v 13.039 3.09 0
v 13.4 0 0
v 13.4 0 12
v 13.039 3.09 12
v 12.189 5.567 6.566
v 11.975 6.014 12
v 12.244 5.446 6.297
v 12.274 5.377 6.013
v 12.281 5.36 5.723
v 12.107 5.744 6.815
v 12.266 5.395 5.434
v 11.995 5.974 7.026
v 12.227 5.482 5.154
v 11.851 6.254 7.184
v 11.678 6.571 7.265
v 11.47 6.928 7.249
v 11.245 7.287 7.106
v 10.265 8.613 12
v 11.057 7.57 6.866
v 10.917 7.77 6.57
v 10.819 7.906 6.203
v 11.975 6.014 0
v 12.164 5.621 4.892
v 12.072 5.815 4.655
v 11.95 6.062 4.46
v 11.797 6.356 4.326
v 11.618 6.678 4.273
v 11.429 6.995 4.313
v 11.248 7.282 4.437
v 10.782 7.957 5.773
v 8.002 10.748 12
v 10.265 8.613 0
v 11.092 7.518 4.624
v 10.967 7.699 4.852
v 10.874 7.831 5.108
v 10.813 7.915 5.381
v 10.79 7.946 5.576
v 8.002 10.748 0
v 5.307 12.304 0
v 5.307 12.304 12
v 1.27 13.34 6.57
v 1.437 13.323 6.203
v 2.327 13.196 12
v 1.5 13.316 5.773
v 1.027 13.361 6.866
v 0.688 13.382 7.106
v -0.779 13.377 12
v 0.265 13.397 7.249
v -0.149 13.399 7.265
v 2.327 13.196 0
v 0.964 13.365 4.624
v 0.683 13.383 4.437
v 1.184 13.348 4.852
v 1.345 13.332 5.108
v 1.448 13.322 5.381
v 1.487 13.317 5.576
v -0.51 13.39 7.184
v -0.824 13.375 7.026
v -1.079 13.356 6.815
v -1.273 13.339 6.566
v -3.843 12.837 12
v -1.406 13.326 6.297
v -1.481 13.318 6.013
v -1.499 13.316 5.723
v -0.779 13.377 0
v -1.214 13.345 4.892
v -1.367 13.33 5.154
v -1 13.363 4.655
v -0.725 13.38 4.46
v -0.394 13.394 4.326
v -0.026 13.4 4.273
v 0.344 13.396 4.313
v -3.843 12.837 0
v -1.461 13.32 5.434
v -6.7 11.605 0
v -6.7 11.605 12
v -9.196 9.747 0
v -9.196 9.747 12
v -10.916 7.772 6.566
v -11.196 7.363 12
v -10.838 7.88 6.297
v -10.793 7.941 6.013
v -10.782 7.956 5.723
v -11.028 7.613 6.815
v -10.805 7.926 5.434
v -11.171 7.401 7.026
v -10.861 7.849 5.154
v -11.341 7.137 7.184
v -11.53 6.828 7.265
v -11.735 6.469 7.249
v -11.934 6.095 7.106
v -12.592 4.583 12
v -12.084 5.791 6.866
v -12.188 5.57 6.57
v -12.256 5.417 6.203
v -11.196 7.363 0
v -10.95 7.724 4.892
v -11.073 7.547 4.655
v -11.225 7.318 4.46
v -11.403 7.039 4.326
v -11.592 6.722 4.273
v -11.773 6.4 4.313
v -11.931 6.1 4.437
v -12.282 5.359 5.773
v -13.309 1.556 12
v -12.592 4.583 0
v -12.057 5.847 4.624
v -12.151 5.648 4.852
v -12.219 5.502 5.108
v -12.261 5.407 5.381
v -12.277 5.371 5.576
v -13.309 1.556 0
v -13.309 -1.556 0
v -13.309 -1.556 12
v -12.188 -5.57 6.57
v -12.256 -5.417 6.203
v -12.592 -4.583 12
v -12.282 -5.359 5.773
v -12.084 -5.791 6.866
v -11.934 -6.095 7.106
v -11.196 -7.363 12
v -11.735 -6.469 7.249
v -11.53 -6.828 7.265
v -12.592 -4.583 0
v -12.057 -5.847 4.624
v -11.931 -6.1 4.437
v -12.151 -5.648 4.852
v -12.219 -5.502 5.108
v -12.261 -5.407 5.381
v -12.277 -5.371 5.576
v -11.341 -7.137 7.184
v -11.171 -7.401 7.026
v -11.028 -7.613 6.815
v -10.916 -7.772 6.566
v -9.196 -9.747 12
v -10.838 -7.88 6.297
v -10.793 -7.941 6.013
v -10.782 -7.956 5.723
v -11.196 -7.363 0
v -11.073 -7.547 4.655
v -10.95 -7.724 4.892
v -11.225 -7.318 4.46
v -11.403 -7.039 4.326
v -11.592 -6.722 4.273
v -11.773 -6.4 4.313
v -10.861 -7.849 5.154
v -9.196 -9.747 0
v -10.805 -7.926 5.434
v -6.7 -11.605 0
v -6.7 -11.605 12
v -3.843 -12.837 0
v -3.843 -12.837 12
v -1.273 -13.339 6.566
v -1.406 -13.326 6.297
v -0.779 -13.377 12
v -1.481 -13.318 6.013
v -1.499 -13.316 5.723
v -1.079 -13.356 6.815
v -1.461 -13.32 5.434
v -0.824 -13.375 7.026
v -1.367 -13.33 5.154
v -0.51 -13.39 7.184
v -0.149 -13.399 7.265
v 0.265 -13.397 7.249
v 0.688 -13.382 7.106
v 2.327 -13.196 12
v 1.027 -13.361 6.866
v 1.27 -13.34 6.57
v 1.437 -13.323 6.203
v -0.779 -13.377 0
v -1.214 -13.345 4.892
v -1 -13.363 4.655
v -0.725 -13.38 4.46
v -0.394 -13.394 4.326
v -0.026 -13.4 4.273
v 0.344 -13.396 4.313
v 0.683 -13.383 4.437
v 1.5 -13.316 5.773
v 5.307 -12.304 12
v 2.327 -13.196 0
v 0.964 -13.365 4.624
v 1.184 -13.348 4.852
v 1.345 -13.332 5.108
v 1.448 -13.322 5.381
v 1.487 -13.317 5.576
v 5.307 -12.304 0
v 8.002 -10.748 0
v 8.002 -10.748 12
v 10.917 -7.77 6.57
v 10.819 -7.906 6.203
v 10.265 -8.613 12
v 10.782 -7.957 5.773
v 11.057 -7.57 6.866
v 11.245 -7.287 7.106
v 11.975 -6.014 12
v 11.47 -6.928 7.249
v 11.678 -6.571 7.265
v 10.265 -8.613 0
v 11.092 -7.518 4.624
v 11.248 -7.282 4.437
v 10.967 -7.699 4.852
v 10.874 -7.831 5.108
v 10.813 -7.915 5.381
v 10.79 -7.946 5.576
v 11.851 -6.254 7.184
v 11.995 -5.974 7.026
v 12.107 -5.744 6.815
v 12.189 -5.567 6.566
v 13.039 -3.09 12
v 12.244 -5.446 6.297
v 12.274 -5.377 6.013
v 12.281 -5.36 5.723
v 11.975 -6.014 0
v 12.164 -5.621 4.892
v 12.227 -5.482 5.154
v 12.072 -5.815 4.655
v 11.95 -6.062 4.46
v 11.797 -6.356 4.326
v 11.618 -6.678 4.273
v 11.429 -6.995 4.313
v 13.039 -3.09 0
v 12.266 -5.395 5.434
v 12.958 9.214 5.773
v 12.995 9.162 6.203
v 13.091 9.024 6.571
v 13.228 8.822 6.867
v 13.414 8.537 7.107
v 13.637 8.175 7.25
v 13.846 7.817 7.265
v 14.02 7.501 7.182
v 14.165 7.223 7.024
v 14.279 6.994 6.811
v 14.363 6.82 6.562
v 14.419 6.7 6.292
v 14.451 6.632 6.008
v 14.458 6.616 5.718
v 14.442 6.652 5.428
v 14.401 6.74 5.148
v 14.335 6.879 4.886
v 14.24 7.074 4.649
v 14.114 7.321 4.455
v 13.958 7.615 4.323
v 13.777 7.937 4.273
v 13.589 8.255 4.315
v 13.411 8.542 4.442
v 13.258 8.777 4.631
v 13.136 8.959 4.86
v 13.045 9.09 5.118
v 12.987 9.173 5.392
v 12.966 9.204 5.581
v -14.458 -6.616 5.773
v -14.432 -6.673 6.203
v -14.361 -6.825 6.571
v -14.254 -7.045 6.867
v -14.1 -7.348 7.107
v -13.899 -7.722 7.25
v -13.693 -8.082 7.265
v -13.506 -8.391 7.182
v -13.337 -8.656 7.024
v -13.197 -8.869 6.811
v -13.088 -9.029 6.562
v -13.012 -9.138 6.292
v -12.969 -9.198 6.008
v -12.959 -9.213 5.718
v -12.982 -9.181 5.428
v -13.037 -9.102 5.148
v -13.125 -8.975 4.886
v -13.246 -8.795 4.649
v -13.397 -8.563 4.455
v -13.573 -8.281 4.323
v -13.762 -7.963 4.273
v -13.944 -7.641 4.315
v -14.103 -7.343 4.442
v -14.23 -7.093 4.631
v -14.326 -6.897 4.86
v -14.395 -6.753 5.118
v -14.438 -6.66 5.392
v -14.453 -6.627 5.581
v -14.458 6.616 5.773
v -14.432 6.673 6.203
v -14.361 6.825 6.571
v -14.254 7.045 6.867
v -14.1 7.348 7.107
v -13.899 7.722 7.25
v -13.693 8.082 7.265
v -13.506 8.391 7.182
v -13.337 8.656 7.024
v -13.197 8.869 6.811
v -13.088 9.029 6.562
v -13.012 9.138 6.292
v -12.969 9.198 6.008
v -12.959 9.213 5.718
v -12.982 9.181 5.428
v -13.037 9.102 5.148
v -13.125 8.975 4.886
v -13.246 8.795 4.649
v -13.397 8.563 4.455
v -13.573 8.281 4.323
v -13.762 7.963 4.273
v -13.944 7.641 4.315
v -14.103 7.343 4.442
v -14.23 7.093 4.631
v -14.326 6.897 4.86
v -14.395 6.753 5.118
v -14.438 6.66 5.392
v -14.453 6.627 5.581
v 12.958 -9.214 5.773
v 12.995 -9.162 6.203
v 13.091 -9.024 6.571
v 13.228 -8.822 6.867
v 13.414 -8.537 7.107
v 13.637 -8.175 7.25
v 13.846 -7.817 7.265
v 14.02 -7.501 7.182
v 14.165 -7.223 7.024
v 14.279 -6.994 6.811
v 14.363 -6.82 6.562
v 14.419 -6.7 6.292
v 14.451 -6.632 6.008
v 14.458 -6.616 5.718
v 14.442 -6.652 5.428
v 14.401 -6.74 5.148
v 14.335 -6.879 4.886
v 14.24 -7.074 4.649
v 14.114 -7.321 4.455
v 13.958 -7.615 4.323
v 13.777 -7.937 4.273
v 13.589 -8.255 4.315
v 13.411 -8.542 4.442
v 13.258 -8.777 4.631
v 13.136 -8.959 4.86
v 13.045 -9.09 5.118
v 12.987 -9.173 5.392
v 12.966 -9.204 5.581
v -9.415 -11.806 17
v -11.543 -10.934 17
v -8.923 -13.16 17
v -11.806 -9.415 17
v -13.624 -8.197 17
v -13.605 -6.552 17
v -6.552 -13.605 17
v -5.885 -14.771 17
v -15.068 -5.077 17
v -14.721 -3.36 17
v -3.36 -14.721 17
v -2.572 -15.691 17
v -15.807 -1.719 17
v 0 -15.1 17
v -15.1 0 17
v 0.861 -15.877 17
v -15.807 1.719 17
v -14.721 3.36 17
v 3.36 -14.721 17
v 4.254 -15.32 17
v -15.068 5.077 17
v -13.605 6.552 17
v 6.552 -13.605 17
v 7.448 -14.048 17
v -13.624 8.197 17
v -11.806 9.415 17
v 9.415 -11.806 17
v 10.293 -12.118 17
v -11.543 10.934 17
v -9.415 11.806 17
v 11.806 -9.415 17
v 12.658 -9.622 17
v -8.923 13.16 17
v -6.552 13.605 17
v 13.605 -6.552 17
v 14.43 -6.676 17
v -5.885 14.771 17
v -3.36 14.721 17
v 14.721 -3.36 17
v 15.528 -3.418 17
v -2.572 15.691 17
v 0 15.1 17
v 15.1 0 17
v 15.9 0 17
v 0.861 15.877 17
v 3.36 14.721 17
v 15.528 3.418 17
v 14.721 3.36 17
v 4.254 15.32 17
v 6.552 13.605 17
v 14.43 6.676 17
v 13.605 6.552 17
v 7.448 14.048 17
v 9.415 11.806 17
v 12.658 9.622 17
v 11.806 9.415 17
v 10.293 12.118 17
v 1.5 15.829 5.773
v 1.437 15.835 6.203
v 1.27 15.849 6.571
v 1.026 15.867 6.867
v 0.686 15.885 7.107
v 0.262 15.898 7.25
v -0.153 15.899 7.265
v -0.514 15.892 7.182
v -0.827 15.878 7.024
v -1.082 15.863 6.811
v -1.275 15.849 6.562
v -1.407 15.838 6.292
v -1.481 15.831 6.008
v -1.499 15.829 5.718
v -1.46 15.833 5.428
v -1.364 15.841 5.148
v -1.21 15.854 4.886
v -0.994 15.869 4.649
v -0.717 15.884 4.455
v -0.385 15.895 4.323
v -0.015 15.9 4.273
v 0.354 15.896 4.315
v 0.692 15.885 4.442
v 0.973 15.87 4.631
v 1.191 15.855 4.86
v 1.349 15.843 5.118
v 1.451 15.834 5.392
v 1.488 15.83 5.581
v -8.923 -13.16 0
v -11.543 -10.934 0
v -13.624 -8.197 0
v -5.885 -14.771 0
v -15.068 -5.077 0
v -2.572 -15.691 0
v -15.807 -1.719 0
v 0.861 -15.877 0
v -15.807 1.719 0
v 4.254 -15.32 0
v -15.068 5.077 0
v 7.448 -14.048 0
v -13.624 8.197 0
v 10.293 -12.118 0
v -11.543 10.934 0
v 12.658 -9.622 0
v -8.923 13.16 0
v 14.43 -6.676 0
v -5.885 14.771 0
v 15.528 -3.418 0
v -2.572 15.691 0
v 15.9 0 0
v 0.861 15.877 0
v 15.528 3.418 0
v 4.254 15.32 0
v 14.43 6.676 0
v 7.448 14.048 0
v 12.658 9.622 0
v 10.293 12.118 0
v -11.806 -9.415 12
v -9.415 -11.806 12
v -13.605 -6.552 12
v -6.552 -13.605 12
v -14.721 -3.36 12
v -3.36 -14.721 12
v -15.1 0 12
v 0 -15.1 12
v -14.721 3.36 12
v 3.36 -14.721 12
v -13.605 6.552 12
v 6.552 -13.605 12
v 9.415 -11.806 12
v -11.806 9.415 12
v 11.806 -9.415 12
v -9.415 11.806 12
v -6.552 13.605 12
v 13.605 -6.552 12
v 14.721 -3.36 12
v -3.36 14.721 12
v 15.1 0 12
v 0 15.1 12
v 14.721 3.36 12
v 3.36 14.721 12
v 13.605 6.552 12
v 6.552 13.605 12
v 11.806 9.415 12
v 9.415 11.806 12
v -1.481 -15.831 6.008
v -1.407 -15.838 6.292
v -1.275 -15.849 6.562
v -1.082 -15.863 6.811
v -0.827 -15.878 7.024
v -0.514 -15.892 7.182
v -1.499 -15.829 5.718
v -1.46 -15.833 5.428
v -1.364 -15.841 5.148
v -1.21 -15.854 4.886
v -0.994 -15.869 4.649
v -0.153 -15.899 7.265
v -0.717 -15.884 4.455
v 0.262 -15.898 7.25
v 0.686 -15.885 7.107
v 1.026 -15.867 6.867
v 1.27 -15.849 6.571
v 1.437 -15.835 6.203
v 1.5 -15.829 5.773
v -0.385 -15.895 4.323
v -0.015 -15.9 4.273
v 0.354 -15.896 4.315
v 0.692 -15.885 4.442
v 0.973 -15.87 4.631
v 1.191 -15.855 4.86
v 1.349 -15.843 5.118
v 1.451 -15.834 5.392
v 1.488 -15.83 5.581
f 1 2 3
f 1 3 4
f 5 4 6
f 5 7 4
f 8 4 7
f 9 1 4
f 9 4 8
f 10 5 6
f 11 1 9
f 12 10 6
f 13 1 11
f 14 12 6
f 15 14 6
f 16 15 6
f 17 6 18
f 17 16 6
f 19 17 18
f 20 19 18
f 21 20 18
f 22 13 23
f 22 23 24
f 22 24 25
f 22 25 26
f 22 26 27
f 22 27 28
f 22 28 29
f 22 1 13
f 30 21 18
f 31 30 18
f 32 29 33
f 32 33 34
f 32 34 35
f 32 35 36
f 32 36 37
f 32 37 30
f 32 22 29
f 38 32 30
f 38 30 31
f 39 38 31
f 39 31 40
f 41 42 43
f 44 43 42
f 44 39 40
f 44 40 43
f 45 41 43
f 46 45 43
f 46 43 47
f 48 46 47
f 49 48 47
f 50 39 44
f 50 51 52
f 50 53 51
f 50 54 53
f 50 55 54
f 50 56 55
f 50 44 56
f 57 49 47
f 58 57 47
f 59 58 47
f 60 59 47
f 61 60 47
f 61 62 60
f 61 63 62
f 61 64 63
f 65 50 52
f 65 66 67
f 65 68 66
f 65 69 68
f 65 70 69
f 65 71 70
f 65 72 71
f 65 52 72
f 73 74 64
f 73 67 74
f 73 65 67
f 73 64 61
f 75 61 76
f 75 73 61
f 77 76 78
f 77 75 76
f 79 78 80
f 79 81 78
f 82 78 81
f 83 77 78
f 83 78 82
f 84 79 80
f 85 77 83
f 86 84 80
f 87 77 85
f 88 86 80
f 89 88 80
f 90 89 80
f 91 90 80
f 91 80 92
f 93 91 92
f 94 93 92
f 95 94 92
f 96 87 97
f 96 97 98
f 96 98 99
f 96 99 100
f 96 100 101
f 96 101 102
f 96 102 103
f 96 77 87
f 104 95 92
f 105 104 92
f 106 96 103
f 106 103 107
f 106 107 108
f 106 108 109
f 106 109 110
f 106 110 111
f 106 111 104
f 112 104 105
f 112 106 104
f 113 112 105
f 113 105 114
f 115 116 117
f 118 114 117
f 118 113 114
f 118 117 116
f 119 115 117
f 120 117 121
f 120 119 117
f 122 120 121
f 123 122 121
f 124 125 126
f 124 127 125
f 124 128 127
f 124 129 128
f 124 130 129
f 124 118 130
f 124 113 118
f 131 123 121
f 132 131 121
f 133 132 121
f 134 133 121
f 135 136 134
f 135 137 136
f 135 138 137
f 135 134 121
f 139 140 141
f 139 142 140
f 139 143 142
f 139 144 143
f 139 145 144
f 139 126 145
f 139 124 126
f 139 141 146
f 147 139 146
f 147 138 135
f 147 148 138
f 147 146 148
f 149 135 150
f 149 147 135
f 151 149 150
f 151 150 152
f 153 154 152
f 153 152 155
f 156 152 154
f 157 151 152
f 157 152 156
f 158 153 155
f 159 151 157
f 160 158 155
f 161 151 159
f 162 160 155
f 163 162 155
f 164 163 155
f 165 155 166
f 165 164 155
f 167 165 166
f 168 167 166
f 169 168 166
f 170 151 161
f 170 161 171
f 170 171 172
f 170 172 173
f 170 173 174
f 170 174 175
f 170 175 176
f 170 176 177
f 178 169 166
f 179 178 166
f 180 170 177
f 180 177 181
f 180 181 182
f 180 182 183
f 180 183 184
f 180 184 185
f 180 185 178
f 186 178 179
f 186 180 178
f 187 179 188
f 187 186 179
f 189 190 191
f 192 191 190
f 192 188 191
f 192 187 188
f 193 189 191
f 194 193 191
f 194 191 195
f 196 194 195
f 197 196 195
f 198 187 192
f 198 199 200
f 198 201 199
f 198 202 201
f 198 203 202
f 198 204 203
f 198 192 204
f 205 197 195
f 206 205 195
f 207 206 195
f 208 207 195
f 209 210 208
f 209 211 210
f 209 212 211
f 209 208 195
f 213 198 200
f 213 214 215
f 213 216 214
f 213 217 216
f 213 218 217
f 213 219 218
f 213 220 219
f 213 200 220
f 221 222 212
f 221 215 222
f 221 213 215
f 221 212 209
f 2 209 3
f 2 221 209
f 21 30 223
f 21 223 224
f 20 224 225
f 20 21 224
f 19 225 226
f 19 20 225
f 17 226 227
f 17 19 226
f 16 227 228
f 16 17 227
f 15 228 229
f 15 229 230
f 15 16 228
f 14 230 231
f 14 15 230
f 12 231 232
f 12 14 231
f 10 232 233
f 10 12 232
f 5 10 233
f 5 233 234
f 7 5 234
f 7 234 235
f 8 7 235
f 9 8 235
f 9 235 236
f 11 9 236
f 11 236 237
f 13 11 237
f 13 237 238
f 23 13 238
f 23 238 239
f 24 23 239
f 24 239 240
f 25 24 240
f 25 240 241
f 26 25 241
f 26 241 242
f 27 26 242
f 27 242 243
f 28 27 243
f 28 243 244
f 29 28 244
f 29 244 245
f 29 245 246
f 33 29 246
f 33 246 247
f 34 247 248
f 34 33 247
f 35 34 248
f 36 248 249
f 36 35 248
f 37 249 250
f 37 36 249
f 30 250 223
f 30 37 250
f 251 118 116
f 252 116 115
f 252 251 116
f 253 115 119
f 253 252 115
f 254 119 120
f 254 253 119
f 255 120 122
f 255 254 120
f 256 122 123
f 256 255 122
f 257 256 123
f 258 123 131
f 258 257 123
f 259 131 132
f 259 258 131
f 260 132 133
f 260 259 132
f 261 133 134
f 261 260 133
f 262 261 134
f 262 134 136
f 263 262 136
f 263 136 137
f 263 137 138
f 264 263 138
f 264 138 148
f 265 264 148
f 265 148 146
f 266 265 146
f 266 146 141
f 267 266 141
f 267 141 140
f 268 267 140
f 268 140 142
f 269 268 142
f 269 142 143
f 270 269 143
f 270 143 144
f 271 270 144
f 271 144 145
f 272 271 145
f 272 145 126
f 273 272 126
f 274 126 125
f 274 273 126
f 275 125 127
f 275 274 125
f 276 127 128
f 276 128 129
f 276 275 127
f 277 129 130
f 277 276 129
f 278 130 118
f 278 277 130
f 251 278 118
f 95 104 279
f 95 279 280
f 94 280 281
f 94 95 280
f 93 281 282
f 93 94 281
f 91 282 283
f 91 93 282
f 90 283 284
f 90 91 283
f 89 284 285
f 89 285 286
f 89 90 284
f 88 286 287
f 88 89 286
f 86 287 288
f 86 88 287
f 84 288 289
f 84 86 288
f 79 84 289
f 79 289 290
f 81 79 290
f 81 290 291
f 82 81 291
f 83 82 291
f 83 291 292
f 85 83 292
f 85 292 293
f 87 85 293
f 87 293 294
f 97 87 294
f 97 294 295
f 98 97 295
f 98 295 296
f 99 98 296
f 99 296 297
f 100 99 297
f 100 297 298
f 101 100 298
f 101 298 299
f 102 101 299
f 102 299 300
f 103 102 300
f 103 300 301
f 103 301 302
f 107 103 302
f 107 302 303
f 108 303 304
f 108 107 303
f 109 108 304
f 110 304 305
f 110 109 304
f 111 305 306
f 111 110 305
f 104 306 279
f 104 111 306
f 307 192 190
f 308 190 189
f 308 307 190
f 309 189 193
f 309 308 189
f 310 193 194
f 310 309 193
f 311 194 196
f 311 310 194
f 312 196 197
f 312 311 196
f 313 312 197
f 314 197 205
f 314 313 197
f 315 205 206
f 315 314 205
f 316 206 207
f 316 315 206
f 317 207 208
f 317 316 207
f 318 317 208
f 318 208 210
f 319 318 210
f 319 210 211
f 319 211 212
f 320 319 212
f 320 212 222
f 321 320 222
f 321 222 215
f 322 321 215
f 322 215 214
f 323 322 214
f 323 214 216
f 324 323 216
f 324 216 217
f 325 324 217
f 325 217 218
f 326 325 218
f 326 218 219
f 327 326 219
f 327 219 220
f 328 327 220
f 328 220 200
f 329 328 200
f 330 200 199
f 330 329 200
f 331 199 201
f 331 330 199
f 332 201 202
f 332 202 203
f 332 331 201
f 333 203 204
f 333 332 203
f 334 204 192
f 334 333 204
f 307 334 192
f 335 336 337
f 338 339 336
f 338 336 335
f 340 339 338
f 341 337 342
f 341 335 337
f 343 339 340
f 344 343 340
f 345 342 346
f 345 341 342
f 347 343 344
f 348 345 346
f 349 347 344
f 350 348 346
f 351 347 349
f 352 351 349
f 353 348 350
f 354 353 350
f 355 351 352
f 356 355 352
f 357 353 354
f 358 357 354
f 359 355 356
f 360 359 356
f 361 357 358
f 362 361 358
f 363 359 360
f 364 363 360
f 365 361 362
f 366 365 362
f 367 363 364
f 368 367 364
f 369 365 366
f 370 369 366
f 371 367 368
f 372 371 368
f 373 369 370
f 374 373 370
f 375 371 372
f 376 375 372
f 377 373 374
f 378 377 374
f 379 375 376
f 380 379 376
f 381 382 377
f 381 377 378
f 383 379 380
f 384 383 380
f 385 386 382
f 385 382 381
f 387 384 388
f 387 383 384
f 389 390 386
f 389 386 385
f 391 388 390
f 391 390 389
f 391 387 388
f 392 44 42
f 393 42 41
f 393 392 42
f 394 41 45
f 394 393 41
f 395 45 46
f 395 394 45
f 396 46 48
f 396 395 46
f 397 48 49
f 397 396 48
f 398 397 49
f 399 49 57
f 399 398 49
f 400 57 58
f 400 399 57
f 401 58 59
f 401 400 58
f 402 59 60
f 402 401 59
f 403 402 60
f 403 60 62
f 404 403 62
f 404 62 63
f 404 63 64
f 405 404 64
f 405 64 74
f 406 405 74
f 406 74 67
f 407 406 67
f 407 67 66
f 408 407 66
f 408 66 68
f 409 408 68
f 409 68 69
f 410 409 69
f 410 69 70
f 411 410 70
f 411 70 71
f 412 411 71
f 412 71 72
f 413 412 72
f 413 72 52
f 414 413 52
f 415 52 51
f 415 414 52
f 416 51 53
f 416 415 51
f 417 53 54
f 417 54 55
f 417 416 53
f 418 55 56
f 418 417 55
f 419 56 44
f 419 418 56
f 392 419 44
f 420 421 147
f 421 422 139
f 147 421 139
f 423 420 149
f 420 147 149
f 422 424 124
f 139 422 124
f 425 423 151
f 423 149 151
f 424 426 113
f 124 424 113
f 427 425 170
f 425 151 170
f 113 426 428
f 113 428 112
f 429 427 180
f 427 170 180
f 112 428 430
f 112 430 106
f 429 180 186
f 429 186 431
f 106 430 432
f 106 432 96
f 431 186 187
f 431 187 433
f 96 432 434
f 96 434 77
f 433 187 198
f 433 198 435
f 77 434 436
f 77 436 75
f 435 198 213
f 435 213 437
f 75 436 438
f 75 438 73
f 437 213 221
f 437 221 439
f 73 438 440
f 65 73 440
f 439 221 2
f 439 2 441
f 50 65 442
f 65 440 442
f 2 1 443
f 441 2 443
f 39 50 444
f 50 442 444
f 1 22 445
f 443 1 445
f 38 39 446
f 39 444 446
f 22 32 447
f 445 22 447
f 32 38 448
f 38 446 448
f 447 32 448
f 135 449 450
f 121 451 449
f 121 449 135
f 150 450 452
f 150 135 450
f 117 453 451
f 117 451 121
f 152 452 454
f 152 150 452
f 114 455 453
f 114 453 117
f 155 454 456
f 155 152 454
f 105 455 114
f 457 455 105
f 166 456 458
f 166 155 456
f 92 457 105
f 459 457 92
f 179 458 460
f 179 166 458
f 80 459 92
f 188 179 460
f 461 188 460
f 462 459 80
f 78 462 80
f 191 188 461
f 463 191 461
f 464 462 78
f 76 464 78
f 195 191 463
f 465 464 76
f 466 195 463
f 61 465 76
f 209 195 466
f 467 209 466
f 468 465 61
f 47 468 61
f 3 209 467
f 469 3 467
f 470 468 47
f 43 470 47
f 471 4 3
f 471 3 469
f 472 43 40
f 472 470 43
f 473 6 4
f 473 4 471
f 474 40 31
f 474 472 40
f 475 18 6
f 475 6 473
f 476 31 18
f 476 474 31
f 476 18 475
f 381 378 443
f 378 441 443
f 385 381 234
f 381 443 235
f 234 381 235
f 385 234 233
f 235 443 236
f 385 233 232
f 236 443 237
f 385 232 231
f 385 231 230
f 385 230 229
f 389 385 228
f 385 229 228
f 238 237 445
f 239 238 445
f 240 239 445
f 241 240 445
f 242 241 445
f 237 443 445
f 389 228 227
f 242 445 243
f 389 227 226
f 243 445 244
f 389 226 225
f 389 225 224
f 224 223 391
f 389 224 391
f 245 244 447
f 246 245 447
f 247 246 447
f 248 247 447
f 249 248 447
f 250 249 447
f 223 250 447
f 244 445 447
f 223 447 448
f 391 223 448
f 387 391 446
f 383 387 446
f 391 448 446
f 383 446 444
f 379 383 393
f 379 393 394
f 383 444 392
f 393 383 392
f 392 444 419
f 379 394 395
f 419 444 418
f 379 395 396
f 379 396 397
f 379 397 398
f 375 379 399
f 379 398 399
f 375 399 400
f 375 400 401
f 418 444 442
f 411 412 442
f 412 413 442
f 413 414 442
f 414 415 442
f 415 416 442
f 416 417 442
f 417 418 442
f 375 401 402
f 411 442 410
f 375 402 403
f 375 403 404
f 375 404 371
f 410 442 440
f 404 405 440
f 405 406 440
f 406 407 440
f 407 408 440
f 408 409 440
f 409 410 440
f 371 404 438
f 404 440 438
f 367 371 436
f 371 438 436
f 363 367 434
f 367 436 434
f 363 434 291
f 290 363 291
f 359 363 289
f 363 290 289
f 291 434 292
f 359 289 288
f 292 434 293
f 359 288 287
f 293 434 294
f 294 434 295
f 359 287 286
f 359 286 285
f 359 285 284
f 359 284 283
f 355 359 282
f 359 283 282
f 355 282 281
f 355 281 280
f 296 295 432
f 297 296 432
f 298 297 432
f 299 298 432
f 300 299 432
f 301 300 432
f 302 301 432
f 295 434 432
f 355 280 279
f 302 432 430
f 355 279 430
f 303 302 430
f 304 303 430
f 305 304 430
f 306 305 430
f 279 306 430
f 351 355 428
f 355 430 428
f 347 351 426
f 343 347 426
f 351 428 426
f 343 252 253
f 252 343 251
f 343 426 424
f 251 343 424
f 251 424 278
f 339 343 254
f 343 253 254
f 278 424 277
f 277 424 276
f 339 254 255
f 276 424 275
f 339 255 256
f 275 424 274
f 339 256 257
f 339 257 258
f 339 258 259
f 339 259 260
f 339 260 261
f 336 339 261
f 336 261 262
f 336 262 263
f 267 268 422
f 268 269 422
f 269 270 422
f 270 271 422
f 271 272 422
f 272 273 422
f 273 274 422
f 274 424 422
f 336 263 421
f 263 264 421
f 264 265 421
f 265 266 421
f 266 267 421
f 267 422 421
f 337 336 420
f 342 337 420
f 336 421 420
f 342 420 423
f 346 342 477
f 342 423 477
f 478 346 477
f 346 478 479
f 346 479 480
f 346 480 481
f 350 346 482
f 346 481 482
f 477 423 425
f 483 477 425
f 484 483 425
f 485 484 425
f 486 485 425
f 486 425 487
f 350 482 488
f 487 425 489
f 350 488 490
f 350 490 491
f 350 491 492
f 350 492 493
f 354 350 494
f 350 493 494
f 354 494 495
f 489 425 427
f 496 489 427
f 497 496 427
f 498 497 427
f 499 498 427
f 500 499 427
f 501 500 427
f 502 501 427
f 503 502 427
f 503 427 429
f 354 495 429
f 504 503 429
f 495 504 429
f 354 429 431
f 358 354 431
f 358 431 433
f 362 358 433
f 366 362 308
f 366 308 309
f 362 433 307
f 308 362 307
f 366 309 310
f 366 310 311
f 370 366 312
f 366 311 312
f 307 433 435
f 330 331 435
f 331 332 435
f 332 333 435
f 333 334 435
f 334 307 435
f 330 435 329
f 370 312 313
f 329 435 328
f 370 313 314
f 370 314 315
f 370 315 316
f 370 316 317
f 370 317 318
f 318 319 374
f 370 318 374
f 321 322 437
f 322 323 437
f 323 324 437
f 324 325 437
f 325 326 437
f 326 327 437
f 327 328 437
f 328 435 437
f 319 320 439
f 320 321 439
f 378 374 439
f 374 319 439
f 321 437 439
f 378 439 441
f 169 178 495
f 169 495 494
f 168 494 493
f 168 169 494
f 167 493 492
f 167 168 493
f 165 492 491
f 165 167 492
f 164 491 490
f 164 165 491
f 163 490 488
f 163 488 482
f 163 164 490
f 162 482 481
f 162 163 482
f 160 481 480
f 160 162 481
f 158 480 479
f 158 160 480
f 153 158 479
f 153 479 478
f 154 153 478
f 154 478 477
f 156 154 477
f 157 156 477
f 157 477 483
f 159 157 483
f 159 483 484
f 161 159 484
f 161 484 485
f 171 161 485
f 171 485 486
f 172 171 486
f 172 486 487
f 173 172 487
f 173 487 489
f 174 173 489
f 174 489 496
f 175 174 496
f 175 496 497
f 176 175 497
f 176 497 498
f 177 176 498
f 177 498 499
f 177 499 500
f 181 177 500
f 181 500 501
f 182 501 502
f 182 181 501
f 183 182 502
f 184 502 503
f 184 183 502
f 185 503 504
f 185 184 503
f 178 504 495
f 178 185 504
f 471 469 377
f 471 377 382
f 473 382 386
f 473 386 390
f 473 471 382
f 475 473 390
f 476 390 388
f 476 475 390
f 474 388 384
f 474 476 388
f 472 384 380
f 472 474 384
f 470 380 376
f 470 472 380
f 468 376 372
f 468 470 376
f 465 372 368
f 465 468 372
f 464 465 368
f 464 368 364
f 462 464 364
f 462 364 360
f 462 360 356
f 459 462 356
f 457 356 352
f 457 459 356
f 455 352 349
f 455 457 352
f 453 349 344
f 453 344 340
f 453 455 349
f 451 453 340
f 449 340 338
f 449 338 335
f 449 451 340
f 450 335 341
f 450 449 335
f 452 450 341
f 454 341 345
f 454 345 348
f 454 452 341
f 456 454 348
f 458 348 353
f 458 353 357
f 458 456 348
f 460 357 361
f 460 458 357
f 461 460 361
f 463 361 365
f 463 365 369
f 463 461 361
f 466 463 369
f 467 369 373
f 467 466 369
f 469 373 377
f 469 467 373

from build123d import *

# Parameters (mm, degrees)
F0_R     = 15.9
F0_R_2   = 13.4
F1_DEPTH = 12
F2_R     = 1.5
F3_DEPTH = 50
F5_COUNT = 3
F7_R     = 15.9
F7_R_2   = 15.1
F8_DEPTH = 5


with BuildPart() as f1:
    # F0 (on Top) → F1 (new body)
    with BuildSketch(Plane.XY):
        Circle(F0_R)
        Circle(F0_R_2, mode=Mode.SUBTRACT)
    extrude(amount=F1_DEPTH)


with BuildPart() as f3:
    # F2 (on Front) → F3 (new body)
    with BuildSketch(Plane.XZ):
        with Locations((0, 5.772834)):
            Circle(F2_R)
    extrude(amount=F3_DEPTH)


with BuildPart() as f3_1:
    # F4: moved
    add(f3.part.moved(Location((0, 25.2, 0))))


with BuildPart() as f5_1:
    # F5: instance of F3
    add(f3_1.part.rotate(Axis((0, 0, 0), (0, 0, -1)), 1 * 360 / F5_COUNT))


with BuildPart() as f5_2:
    # F5: instance of F3
    add(f3_1.part.rotate(Axis((0, 0, 0), (0, 0, -1)), 2 * 360 / F5_COUNT))


with BuildPart() as f1_1:
    add(f1.part)

    # F6: cut F5_1, F3, F5_2
    add(f5_1.part, mode=Mode.SUBTRACT)
    add(f3_1.part, mode=Mode.SUBTRACT)
    add(f5_2.part, mode=Mode.SUBTRACT)

    # F7 (on face) → F8 (join)
    with BuildSketch(Plane.XY.offset(12)):
        Circle(F7_R)
        Circle(F7_R_2, mode=Mode.SUBTRACT)
    extrude(amount=F8_DEPTH)


solid = f1_1.part
